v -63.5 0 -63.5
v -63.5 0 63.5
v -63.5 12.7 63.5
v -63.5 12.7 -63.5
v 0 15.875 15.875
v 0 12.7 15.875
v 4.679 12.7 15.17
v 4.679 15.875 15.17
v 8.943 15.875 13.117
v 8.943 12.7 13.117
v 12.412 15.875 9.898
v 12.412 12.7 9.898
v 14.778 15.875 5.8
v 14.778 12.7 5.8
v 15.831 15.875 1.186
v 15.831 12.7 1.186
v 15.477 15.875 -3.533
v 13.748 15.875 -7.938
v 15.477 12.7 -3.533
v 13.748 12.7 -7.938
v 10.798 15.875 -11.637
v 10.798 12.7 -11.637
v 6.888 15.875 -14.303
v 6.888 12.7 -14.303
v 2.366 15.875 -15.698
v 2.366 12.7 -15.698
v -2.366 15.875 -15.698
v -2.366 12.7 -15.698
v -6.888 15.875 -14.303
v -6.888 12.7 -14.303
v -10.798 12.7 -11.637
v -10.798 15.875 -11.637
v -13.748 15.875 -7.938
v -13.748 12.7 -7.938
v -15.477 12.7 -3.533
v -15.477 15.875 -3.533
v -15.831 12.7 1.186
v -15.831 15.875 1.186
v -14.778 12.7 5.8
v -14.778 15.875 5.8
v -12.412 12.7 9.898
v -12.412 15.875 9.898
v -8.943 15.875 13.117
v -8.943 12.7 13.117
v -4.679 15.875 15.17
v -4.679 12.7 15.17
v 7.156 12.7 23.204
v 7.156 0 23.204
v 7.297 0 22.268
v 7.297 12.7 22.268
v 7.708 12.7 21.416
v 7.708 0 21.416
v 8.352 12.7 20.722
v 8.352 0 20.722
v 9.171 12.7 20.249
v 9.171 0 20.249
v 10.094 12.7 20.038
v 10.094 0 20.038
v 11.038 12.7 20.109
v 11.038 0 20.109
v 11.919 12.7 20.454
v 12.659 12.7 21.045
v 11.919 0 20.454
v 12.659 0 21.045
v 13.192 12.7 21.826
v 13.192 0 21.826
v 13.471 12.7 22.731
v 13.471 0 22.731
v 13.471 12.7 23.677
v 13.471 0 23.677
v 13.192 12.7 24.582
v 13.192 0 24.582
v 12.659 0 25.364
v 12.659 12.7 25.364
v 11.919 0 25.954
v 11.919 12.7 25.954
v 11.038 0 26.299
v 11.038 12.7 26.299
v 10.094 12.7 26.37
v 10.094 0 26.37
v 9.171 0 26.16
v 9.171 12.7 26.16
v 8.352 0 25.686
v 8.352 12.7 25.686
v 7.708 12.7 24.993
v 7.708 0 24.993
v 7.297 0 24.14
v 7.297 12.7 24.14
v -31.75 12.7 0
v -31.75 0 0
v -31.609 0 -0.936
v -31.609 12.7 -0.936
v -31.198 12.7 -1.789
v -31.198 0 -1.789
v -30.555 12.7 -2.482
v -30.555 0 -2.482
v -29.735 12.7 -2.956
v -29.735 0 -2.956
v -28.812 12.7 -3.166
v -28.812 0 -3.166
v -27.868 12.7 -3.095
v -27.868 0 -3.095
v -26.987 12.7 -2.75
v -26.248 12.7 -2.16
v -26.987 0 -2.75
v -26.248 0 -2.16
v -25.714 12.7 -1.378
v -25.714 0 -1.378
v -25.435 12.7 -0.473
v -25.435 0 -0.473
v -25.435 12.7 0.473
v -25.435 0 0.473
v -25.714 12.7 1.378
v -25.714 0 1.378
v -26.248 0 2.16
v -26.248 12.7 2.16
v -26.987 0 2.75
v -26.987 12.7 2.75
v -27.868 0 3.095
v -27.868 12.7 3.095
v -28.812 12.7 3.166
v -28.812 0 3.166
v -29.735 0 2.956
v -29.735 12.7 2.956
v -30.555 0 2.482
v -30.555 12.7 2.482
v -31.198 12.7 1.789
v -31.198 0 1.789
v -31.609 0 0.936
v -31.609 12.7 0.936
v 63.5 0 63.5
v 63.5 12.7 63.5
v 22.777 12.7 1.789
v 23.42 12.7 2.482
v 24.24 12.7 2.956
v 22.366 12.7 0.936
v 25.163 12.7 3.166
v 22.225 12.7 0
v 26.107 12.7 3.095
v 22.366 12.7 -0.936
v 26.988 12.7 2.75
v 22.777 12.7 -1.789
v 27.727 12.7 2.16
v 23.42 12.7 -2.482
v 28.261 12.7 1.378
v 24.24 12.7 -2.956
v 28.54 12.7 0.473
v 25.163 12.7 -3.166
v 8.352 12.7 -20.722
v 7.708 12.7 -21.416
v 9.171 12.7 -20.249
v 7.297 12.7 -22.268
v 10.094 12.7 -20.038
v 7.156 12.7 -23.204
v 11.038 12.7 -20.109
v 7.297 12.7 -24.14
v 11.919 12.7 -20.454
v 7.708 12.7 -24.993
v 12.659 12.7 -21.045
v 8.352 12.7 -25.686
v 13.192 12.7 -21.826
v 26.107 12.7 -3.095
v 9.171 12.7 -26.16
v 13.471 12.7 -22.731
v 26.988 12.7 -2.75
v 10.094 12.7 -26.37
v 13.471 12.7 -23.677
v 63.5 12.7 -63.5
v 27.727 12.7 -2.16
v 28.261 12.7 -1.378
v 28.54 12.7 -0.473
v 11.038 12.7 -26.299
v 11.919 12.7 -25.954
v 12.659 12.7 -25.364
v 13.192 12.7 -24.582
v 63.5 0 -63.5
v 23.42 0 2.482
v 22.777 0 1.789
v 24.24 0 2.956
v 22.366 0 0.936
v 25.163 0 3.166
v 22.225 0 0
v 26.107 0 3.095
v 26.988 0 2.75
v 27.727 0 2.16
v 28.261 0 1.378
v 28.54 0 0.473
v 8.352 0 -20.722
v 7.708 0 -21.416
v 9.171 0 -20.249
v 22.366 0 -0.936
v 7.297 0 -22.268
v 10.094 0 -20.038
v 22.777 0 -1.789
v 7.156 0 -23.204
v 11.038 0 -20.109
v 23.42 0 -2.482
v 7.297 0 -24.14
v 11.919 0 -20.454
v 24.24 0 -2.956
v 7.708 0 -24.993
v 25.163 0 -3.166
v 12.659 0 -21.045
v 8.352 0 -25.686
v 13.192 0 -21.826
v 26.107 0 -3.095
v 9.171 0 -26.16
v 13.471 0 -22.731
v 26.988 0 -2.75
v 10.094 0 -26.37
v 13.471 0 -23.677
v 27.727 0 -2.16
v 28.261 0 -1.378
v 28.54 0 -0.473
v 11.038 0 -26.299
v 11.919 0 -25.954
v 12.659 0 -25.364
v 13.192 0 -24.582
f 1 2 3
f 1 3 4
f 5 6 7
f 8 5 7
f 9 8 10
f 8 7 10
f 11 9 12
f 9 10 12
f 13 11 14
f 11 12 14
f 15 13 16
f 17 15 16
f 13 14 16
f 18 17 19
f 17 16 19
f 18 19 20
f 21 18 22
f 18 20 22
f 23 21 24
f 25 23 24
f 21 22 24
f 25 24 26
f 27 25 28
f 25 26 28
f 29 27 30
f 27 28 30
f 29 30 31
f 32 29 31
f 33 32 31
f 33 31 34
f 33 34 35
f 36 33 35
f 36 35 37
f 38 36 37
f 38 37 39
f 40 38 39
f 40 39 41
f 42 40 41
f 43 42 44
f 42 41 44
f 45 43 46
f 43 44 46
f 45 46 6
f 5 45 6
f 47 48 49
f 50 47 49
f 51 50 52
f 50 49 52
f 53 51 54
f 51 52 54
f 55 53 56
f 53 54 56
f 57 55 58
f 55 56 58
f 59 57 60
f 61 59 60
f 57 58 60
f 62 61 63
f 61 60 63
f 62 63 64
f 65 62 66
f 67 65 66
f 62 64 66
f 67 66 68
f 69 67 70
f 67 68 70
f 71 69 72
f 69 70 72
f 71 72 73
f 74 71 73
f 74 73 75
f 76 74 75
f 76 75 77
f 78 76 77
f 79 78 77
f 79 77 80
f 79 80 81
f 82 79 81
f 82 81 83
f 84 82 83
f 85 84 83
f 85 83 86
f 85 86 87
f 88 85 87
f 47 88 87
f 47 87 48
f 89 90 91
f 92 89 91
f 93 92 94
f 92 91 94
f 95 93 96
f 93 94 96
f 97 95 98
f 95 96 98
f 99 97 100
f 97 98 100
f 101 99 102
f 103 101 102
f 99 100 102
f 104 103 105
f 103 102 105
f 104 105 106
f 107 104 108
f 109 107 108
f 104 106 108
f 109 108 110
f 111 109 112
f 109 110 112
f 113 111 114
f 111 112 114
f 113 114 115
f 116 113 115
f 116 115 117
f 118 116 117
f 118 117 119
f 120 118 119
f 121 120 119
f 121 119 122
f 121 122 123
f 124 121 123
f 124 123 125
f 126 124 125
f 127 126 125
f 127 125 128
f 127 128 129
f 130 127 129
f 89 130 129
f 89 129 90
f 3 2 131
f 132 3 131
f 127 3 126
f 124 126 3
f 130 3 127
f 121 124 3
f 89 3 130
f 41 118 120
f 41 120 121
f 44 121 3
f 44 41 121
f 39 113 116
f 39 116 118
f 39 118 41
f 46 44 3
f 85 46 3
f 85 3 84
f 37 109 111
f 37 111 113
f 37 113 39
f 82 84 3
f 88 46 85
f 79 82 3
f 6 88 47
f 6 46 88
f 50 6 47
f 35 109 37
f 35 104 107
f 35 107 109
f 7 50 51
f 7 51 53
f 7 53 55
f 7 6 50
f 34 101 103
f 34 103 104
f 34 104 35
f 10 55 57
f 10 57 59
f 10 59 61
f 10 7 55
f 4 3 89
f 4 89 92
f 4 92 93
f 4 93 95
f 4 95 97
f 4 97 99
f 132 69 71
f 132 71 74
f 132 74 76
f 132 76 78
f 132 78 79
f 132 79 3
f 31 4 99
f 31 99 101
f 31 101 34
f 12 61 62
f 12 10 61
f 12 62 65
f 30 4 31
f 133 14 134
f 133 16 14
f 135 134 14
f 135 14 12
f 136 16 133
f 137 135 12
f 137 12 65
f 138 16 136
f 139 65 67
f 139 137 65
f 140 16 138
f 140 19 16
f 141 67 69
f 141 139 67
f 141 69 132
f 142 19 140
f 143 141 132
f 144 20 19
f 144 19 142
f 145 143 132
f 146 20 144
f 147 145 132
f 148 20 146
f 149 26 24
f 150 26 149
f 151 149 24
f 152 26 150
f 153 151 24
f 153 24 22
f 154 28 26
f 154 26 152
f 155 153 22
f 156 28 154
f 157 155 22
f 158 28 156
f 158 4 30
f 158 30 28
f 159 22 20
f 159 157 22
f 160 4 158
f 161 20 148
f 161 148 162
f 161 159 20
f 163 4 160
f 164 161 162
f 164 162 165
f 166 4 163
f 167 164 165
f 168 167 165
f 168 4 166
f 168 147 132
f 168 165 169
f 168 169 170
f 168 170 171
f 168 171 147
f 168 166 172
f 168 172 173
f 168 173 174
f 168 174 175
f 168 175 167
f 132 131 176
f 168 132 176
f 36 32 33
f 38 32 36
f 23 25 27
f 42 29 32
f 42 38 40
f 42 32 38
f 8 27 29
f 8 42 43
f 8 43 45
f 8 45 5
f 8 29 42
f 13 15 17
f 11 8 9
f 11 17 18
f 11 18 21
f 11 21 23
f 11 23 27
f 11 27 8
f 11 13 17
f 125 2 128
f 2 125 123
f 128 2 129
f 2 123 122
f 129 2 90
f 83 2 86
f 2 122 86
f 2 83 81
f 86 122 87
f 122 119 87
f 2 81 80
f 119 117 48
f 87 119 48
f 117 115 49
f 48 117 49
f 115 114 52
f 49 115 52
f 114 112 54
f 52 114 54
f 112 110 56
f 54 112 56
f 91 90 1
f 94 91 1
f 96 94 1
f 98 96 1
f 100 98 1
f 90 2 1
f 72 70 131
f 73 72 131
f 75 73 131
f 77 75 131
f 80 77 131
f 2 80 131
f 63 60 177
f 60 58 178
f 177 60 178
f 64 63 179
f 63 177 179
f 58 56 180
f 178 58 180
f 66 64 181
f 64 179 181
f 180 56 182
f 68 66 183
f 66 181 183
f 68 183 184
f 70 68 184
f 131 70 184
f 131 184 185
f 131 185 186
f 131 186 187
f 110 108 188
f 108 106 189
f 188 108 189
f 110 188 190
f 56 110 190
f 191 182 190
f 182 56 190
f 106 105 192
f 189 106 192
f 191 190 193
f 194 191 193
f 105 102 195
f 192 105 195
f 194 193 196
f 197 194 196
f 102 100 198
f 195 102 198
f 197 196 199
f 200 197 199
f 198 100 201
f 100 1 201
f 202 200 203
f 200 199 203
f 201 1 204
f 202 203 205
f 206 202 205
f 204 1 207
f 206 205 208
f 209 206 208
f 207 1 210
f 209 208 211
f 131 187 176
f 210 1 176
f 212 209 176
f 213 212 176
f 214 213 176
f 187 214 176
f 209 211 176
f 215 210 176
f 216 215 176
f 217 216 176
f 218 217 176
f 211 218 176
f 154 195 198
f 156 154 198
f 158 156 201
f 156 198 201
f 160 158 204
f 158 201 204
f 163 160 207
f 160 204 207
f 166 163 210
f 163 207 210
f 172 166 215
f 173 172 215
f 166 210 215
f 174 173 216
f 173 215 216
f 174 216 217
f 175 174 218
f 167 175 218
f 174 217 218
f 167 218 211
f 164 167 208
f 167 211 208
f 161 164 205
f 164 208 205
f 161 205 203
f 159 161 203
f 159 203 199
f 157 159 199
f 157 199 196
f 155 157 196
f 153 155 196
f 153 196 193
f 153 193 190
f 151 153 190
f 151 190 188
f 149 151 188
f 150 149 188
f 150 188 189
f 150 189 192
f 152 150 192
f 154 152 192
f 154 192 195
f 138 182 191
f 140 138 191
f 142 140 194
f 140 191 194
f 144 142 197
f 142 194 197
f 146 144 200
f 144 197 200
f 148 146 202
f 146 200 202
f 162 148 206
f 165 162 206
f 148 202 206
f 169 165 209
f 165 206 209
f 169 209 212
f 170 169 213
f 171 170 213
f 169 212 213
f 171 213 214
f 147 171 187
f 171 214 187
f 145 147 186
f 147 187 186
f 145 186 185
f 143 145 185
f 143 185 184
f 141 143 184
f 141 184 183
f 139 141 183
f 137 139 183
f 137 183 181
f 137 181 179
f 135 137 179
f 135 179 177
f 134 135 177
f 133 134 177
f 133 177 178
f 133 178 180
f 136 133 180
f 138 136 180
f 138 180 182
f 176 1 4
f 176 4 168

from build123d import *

# Parameters (mm, degrees)
SKETCH1_W                   = 127
SKETCH1_H                   = 127
BOSS_EXTRUDE1_DEPTH         = 12.7
SKETCH3_R                   = 15.875
BOSS_EXTRUDE2_DEPTH         = 3.175
F_1_4_0_25_DIAMETER_HOLE1_D = 6.35
F_1_4_0_25_DIAMETER_HOLE2_D = 6.35


with BuildPart() as part:
    # Sketch1 → Boss-Extrude1 (new body)
    with BuildSketch(Plane(origin=(0, 0, 0), x_dir=(1, 0, 0), z_dir=(0, 1, 0))):
        Rectangle(SKETCH1_W, SKETCH1_H)
    extrude(amount=BOSS_EXTRUDE1_DEPTH)

    # Sketch3 → Boss-Extrude2 (add)
    with BuildSketch(Plane(origin=(0, 12.7, 0), x_dir=(1, 0, 0), z_dir=(0, 1, 0))):
        with Locations(Location((0, 0, 0), (0, 0, 270))):
            Circle(SKETCH3_R)
    extrude(amount=BOSS_EXTRUDE2_DEPTH)

    # 1/4 (0.25) Diameter Hole1 (through all)
    with Locations(Plane(origin=(0, 12.7, 0), x_dir=(1, 0, 0), z_dir=(0, 1, 0))):
        with Locations((10.331110734, 23.204054624), (25.4, 0), (10.331110734, -23.204054624)):
            Hole(F_1_4_0_25_DIAMETER_HOLE1_D / 2)

    # 1/4 (0.25) Diameter Hole2 (through all)
    with Locations(Plane(origin=(0, 12.7, 0), x_dir=(1, 0, 0), z_dir=(0, 1, 0))):
        with Locations((-28.575, 0)):
            Hole(F_1_4_0_25_DIAMETER_HOLE2_D / 2)


solid = part.part
